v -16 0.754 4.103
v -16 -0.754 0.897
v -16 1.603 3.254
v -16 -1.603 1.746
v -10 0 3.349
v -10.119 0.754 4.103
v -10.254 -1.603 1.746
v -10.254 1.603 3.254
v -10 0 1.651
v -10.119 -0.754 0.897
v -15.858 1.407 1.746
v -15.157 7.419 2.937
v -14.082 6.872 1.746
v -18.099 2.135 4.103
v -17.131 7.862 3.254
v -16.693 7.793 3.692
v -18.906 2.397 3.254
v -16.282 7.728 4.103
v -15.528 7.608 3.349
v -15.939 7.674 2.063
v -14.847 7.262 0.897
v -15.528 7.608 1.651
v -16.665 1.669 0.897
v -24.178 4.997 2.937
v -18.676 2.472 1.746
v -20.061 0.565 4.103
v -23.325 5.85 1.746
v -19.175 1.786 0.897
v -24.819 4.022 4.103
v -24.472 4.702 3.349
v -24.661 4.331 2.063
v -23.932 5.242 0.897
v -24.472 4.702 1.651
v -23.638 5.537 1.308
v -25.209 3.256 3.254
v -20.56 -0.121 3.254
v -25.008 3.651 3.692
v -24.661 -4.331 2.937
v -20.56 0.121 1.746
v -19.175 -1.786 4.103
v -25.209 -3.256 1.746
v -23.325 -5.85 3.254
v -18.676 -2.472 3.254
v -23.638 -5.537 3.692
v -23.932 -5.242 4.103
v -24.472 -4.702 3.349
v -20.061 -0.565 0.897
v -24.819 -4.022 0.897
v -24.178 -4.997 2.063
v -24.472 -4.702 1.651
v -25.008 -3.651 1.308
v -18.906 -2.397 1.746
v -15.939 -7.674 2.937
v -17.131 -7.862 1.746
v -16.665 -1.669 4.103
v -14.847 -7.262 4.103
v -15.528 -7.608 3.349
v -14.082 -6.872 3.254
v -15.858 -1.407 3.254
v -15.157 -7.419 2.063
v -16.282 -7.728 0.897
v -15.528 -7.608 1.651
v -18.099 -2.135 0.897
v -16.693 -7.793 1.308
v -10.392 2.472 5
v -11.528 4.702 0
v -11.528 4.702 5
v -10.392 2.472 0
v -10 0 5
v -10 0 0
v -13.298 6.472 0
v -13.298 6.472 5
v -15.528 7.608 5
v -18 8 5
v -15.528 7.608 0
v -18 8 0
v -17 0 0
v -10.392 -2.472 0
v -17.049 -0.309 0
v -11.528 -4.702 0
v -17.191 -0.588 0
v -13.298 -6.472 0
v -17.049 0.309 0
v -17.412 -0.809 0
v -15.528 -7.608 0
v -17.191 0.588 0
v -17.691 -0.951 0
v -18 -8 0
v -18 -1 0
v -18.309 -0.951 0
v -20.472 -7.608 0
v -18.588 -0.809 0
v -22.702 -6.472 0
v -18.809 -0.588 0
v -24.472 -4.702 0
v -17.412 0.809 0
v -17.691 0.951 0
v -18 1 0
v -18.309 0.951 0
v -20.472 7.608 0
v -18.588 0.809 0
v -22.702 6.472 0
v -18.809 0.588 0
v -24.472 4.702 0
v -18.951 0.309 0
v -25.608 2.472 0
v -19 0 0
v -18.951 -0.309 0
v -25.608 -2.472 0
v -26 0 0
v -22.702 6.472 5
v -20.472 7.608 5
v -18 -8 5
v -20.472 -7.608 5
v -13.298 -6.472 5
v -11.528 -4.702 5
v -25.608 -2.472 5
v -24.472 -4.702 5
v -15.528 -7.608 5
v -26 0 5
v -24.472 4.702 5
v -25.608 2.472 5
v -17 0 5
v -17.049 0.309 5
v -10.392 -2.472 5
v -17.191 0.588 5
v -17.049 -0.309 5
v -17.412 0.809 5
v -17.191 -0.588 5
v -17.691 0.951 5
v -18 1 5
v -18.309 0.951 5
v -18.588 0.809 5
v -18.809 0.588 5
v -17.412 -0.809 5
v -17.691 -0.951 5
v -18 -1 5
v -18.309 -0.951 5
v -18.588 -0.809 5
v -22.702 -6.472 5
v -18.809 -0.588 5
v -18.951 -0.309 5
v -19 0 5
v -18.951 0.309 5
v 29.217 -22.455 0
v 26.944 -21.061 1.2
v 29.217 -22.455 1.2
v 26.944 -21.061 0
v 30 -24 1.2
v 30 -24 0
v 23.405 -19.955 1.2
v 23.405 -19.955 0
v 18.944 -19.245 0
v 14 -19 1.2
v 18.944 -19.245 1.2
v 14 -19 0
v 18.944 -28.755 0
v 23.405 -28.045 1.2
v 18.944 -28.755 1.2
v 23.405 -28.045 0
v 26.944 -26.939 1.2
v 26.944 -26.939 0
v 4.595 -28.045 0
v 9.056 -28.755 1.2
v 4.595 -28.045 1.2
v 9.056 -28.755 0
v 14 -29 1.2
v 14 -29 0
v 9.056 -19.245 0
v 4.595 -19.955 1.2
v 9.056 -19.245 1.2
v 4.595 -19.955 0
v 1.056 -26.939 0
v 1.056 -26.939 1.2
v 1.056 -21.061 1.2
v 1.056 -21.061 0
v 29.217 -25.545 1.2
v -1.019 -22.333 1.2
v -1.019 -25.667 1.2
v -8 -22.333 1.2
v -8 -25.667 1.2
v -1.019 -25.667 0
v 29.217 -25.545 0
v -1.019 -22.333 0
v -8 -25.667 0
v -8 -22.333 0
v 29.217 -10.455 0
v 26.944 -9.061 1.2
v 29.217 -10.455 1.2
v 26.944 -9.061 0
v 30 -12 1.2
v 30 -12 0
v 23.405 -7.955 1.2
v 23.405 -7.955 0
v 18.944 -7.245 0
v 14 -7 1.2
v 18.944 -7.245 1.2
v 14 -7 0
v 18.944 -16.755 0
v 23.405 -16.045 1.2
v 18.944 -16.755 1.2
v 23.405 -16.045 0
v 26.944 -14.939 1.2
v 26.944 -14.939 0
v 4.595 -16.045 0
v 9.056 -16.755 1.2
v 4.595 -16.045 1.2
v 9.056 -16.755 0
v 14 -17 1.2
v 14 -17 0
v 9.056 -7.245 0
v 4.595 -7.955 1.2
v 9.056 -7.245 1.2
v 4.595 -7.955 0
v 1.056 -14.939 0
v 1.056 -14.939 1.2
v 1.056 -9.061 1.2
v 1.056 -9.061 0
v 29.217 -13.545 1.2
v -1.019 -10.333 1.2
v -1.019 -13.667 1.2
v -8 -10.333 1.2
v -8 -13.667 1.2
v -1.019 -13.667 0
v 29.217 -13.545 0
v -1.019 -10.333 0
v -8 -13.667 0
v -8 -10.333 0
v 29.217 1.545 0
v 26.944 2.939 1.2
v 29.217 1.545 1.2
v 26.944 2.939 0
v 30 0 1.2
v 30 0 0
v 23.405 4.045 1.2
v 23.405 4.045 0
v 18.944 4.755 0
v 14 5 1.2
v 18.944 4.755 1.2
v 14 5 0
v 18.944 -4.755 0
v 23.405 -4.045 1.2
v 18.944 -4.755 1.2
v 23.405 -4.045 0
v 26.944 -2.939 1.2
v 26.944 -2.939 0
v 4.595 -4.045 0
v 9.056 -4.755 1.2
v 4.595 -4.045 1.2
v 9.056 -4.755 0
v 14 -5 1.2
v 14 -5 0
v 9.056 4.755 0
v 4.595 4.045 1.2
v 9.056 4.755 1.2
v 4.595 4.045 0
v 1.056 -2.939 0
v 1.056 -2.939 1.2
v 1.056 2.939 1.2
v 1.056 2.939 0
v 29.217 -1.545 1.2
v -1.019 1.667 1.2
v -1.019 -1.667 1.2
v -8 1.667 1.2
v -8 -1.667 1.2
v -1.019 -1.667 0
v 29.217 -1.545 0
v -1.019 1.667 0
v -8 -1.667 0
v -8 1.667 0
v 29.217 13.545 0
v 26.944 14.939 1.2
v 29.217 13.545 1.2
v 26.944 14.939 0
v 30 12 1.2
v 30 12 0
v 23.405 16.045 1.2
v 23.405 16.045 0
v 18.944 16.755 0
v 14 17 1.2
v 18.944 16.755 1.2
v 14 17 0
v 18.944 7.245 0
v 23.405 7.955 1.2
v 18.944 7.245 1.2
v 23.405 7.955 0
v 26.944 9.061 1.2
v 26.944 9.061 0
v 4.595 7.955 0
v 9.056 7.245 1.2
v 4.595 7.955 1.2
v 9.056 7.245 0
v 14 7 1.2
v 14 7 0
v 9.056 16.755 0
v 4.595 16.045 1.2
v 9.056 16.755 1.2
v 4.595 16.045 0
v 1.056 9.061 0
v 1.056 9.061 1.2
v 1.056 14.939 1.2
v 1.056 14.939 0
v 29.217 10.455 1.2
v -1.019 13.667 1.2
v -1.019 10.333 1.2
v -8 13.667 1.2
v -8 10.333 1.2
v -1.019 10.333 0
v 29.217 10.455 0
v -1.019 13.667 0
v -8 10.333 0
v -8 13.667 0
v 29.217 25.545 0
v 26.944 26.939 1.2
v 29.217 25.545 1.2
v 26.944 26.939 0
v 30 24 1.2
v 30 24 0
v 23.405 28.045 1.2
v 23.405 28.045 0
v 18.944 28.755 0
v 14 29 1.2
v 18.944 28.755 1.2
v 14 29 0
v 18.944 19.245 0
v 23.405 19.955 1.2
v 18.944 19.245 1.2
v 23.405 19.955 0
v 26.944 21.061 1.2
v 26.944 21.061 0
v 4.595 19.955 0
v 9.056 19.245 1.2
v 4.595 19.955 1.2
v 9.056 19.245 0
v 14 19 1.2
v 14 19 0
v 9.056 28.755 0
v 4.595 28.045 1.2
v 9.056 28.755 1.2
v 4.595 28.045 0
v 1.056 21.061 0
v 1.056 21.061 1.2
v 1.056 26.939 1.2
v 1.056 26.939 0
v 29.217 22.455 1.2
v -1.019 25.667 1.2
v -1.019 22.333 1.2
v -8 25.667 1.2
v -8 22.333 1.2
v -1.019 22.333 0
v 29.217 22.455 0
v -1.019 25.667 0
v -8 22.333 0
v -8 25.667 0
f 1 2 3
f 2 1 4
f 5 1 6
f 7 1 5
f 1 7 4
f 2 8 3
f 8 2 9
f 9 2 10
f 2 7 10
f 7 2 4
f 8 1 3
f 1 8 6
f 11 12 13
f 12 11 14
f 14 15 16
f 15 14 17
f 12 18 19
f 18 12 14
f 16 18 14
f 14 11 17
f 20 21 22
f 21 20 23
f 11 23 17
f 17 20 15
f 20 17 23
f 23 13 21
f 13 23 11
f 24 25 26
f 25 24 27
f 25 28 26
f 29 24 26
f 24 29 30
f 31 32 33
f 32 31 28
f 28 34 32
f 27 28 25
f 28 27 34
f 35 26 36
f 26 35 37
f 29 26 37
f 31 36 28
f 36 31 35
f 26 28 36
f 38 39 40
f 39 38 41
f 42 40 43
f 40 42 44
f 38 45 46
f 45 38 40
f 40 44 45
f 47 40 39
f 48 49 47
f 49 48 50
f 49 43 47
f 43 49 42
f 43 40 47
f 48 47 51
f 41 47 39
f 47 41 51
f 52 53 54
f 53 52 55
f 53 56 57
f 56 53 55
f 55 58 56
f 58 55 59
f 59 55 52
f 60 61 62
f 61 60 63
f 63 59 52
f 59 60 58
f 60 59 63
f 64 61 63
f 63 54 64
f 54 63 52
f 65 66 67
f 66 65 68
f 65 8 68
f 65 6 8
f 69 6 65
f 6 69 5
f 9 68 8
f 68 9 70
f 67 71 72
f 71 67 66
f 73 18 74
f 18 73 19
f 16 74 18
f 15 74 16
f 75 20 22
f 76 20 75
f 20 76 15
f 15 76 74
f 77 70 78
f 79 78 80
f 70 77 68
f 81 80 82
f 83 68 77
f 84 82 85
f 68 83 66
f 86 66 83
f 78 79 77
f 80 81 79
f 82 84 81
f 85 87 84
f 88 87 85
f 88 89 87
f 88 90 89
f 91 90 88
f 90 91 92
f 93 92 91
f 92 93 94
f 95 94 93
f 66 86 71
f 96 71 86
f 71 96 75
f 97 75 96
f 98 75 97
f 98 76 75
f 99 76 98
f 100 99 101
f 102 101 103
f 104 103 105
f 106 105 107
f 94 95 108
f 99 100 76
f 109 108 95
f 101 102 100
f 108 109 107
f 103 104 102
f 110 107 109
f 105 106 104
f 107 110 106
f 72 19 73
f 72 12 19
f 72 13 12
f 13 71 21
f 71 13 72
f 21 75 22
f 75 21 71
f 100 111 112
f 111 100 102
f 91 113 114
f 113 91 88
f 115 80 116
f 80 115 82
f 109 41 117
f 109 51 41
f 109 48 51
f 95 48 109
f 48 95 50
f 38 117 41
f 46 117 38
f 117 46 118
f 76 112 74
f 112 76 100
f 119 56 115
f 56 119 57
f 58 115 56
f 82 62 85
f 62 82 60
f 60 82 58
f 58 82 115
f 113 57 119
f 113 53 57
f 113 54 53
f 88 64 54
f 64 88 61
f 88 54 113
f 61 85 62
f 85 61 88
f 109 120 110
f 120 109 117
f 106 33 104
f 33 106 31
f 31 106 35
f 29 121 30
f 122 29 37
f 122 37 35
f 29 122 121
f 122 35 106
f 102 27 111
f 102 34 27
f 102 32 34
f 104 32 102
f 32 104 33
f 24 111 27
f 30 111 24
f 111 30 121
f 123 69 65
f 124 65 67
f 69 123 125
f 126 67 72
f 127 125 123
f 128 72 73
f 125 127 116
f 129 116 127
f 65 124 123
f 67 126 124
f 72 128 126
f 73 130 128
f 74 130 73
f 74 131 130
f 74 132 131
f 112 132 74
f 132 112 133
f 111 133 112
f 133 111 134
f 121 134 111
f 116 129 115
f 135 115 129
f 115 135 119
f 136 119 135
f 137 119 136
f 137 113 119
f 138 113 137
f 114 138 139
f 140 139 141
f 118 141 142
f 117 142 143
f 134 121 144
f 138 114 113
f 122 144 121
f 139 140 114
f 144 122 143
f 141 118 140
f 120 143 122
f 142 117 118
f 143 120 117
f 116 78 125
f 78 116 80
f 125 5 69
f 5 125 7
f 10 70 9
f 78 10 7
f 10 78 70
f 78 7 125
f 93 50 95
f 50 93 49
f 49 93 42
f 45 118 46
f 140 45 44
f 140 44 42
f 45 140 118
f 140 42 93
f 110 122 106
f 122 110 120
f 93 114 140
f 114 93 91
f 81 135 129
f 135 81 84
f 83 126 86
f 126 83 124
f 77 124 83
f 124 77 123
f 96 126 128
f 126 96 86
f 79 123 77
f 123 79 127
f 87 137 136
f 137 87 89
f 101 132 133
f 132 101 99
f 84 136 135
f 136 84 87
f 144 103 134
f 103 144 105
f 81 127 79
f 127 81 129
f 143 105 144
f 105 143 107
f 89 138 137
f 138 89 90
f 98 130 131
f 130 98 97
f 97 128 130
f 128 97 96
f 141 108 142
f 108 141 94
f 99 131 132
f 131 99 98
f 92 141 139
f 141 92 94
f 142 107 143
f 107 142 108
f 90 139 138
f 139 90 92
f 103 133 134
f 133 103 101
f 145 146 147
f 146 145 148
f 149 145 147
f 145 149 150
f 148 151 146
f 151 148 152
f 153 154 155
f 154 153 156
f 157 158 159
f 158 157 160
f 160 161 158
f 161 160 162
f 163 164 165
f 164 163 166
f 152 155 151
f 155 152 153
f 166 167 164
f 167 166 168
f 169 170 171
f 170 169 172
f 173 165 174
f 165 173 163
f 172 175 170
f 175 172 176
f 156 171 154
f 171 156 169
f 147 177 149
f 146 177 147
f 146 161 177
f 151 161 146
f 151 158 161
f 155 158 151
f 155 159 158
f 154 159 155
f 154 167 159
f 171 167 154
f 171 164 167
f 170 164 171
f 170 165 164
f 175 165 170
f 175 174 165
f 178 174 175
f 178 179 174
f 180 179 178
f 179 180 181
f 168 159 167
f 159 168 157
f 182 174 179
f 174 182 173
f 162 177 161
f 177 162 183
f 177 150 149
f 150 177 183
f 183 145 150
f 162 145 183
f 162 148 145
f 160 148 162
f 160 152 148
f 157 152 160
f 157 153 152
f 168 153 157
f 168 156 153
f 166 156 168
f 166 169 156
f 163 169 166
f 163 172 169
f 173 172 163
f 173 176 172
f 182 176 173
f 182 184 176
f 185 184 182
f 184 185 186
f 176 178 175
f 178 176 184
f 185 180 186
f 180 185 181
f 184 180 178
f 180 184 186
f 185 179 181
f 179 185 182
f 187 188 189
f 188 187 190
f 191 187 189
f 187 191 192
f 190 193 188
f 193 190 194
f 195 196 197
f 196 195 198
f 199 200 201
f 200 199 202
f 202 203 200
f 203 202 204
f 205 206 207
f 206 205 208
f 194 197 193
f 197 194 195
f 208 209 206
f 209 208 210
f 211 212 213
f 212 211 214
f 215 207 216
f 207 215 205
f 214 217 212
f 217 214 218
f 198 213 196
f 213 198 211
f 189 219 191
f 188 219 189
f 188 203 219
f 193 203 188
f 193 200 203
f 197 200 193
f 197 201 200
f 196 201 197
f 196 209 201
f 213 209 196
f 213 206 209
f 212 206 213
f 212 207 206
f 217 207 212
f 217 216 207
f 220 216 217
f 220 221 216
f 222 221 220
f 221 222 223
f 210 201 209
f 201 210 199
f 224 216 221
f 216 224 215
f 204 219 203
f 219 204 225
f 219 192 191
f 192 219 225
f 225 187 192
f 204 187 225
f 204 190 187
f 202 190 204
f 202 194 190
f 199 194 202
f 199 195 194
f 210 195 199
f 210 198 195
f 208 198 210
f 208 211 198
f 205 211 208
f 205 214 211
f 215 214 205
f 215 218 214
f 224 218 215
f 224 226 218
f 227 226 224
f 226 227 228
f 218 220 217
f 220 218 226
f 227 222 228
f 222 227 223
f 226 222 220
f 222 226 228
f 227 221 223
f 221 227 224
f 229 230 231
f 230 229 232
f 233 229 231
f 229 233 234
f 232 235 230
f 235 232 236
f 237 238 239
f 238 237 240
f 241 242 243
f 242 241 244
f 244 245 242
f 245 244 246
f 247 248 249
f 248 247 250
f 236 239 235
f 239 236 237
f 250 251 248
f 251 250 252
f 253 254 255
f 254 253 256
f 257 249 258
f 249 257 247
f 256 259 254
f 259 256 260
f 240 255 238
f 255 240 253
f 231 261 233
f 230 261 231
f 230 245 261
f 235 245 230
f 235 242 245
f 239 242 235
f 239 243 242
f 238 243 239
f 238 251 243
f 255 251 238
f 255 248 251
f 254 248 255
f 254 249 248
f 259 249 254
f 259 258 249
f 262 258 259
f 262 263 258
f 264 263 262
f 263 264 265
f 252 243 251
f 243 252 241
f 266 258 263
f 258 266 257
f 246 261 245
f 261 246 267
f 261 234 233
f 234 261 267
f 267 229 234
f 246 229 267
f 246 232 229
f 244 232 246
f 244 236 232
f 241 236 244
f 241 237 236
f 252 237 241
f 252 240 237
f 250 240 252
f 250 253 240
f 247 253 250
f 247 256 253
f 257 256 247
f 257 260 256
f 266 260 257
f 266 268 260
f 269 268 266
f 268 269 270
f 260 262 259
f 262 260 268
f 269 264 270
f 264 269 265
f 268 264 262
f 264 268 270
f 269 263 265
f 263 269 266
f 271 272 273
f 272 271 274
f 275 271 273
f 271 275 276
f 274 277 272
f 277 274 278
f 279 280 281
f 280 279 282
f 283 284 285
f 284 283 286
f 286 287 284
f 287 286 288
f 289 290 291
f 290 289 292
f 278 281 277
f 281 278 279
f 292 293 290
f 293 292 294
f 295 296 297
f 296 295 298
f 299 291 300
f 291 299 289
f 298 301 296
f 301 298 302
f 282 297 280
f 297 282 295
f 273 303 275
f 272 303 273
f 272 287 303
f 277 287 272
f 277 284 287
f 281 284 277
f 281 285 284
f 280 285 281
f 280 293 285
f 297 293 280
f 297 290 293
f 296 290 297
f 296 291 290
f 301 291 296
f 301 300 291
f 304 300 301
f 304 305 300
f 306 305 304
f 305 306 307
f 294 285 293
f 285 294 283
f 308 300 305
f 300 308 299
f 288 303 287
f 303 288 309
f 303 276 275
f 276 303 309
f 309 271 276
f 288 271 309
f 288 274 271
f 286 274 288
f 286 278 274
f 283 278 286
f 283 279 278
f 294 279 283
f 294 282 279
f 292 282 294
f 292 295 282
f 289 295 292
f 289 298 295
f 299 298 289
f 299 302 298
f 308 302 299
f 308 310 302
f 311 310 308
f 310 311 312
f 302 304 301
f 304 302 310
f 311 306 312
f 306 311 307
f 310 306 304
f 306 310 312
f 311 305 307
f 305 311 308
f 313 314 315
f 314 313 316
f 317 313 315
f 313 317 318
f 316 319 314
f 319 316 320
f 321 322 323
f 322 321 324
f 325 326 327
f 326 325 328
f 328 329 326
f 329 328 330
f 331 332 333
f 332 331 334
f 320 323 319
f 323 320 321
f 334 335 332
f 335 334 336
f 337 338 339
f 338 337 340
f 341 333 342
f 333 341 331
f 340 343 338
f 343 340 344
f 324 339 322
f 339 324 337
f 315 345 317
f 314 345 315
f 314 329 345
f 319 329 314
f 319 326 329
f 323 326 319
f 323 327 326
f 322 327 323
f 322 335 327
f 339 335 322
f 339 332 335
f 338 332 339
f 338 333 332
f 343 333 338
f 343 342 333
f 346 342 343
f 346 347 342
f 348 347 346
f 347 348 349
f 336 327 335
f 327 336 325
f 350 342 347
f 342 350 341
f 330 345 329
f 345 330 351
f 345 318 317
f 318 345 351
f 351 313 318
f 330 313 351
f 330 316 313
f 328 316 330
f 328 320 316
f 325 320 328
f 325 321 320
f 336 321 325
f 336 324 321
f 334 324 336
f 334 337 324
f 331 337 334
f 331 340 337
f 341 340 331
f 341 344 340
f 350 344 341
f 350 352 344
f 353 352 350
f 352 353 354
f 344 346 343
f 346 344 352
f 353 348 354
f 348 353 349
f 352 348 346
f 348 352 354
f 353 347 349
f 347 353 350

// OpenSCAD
bladeThickness=1.2;
fanRadius=40;
hubRadius=8;
hubHeight=5;
shaftRadius=1;
bladeAngle=45;
blades=5;
flatten=true; //true for printable object; false for assembly preview
bladeWidth=10;


module blade()
{
  translate([tabLength+bladeLength/2,0,0])
  union()
  {
    scale([bladeLength,bladeWidth,1])cylinder(bladeThickness,0.5,0.5,$fn=20,center=true);
    translate([-bladeLength/2,0,0]) cube([tabLength*2,tabWidth,bladeThickness],center=true);
  }
}

module hub()
{
  difference()
  {
    cylinder(hubHeight,hubRadius,hubRadius,center=true,$fn=20);
    cylinder(hubHeight*2,shaftRadius,shaftRadius,center=true,$fn=20);
    for ( i = [0:blades-1] ) 
    {
      rotate( i*360/blades, [0, 0, 1])
      rotate( bladeAngle, [1, 0, 0])
      translate([tabLength+shaftRadius+1,0,0])
      cube([tabLength*2,tabWidth,bladeThickness],center=true);
    }

  }
}

bladeLength=fanRadius-hubRadius;
tabLength=hubRadius-shaftRadius-1;
tabWidth=bladeWidth/3;

if(!flatten)
{
  hub();
  
  for ( i = [0:blades-1] ) {
    rotate( i*360/blades, [0, 0, 1])
    rotate( bladeAngle, [1, 0, 0])
    translate([shaftRadius+1,0,0])blade();
  }
}

if(flatten)
{
  translate([-bladeLength/2-2,0,hubHeight/2])hub();
  
  for ( i = [0:blades-1] ) {
    translate([hubRadius-bladeLength/2,i*(bladeWidth+2)-((blades-1)*(bladeWidth+2)/2),bladeThickness/2])blade();
  }
}
